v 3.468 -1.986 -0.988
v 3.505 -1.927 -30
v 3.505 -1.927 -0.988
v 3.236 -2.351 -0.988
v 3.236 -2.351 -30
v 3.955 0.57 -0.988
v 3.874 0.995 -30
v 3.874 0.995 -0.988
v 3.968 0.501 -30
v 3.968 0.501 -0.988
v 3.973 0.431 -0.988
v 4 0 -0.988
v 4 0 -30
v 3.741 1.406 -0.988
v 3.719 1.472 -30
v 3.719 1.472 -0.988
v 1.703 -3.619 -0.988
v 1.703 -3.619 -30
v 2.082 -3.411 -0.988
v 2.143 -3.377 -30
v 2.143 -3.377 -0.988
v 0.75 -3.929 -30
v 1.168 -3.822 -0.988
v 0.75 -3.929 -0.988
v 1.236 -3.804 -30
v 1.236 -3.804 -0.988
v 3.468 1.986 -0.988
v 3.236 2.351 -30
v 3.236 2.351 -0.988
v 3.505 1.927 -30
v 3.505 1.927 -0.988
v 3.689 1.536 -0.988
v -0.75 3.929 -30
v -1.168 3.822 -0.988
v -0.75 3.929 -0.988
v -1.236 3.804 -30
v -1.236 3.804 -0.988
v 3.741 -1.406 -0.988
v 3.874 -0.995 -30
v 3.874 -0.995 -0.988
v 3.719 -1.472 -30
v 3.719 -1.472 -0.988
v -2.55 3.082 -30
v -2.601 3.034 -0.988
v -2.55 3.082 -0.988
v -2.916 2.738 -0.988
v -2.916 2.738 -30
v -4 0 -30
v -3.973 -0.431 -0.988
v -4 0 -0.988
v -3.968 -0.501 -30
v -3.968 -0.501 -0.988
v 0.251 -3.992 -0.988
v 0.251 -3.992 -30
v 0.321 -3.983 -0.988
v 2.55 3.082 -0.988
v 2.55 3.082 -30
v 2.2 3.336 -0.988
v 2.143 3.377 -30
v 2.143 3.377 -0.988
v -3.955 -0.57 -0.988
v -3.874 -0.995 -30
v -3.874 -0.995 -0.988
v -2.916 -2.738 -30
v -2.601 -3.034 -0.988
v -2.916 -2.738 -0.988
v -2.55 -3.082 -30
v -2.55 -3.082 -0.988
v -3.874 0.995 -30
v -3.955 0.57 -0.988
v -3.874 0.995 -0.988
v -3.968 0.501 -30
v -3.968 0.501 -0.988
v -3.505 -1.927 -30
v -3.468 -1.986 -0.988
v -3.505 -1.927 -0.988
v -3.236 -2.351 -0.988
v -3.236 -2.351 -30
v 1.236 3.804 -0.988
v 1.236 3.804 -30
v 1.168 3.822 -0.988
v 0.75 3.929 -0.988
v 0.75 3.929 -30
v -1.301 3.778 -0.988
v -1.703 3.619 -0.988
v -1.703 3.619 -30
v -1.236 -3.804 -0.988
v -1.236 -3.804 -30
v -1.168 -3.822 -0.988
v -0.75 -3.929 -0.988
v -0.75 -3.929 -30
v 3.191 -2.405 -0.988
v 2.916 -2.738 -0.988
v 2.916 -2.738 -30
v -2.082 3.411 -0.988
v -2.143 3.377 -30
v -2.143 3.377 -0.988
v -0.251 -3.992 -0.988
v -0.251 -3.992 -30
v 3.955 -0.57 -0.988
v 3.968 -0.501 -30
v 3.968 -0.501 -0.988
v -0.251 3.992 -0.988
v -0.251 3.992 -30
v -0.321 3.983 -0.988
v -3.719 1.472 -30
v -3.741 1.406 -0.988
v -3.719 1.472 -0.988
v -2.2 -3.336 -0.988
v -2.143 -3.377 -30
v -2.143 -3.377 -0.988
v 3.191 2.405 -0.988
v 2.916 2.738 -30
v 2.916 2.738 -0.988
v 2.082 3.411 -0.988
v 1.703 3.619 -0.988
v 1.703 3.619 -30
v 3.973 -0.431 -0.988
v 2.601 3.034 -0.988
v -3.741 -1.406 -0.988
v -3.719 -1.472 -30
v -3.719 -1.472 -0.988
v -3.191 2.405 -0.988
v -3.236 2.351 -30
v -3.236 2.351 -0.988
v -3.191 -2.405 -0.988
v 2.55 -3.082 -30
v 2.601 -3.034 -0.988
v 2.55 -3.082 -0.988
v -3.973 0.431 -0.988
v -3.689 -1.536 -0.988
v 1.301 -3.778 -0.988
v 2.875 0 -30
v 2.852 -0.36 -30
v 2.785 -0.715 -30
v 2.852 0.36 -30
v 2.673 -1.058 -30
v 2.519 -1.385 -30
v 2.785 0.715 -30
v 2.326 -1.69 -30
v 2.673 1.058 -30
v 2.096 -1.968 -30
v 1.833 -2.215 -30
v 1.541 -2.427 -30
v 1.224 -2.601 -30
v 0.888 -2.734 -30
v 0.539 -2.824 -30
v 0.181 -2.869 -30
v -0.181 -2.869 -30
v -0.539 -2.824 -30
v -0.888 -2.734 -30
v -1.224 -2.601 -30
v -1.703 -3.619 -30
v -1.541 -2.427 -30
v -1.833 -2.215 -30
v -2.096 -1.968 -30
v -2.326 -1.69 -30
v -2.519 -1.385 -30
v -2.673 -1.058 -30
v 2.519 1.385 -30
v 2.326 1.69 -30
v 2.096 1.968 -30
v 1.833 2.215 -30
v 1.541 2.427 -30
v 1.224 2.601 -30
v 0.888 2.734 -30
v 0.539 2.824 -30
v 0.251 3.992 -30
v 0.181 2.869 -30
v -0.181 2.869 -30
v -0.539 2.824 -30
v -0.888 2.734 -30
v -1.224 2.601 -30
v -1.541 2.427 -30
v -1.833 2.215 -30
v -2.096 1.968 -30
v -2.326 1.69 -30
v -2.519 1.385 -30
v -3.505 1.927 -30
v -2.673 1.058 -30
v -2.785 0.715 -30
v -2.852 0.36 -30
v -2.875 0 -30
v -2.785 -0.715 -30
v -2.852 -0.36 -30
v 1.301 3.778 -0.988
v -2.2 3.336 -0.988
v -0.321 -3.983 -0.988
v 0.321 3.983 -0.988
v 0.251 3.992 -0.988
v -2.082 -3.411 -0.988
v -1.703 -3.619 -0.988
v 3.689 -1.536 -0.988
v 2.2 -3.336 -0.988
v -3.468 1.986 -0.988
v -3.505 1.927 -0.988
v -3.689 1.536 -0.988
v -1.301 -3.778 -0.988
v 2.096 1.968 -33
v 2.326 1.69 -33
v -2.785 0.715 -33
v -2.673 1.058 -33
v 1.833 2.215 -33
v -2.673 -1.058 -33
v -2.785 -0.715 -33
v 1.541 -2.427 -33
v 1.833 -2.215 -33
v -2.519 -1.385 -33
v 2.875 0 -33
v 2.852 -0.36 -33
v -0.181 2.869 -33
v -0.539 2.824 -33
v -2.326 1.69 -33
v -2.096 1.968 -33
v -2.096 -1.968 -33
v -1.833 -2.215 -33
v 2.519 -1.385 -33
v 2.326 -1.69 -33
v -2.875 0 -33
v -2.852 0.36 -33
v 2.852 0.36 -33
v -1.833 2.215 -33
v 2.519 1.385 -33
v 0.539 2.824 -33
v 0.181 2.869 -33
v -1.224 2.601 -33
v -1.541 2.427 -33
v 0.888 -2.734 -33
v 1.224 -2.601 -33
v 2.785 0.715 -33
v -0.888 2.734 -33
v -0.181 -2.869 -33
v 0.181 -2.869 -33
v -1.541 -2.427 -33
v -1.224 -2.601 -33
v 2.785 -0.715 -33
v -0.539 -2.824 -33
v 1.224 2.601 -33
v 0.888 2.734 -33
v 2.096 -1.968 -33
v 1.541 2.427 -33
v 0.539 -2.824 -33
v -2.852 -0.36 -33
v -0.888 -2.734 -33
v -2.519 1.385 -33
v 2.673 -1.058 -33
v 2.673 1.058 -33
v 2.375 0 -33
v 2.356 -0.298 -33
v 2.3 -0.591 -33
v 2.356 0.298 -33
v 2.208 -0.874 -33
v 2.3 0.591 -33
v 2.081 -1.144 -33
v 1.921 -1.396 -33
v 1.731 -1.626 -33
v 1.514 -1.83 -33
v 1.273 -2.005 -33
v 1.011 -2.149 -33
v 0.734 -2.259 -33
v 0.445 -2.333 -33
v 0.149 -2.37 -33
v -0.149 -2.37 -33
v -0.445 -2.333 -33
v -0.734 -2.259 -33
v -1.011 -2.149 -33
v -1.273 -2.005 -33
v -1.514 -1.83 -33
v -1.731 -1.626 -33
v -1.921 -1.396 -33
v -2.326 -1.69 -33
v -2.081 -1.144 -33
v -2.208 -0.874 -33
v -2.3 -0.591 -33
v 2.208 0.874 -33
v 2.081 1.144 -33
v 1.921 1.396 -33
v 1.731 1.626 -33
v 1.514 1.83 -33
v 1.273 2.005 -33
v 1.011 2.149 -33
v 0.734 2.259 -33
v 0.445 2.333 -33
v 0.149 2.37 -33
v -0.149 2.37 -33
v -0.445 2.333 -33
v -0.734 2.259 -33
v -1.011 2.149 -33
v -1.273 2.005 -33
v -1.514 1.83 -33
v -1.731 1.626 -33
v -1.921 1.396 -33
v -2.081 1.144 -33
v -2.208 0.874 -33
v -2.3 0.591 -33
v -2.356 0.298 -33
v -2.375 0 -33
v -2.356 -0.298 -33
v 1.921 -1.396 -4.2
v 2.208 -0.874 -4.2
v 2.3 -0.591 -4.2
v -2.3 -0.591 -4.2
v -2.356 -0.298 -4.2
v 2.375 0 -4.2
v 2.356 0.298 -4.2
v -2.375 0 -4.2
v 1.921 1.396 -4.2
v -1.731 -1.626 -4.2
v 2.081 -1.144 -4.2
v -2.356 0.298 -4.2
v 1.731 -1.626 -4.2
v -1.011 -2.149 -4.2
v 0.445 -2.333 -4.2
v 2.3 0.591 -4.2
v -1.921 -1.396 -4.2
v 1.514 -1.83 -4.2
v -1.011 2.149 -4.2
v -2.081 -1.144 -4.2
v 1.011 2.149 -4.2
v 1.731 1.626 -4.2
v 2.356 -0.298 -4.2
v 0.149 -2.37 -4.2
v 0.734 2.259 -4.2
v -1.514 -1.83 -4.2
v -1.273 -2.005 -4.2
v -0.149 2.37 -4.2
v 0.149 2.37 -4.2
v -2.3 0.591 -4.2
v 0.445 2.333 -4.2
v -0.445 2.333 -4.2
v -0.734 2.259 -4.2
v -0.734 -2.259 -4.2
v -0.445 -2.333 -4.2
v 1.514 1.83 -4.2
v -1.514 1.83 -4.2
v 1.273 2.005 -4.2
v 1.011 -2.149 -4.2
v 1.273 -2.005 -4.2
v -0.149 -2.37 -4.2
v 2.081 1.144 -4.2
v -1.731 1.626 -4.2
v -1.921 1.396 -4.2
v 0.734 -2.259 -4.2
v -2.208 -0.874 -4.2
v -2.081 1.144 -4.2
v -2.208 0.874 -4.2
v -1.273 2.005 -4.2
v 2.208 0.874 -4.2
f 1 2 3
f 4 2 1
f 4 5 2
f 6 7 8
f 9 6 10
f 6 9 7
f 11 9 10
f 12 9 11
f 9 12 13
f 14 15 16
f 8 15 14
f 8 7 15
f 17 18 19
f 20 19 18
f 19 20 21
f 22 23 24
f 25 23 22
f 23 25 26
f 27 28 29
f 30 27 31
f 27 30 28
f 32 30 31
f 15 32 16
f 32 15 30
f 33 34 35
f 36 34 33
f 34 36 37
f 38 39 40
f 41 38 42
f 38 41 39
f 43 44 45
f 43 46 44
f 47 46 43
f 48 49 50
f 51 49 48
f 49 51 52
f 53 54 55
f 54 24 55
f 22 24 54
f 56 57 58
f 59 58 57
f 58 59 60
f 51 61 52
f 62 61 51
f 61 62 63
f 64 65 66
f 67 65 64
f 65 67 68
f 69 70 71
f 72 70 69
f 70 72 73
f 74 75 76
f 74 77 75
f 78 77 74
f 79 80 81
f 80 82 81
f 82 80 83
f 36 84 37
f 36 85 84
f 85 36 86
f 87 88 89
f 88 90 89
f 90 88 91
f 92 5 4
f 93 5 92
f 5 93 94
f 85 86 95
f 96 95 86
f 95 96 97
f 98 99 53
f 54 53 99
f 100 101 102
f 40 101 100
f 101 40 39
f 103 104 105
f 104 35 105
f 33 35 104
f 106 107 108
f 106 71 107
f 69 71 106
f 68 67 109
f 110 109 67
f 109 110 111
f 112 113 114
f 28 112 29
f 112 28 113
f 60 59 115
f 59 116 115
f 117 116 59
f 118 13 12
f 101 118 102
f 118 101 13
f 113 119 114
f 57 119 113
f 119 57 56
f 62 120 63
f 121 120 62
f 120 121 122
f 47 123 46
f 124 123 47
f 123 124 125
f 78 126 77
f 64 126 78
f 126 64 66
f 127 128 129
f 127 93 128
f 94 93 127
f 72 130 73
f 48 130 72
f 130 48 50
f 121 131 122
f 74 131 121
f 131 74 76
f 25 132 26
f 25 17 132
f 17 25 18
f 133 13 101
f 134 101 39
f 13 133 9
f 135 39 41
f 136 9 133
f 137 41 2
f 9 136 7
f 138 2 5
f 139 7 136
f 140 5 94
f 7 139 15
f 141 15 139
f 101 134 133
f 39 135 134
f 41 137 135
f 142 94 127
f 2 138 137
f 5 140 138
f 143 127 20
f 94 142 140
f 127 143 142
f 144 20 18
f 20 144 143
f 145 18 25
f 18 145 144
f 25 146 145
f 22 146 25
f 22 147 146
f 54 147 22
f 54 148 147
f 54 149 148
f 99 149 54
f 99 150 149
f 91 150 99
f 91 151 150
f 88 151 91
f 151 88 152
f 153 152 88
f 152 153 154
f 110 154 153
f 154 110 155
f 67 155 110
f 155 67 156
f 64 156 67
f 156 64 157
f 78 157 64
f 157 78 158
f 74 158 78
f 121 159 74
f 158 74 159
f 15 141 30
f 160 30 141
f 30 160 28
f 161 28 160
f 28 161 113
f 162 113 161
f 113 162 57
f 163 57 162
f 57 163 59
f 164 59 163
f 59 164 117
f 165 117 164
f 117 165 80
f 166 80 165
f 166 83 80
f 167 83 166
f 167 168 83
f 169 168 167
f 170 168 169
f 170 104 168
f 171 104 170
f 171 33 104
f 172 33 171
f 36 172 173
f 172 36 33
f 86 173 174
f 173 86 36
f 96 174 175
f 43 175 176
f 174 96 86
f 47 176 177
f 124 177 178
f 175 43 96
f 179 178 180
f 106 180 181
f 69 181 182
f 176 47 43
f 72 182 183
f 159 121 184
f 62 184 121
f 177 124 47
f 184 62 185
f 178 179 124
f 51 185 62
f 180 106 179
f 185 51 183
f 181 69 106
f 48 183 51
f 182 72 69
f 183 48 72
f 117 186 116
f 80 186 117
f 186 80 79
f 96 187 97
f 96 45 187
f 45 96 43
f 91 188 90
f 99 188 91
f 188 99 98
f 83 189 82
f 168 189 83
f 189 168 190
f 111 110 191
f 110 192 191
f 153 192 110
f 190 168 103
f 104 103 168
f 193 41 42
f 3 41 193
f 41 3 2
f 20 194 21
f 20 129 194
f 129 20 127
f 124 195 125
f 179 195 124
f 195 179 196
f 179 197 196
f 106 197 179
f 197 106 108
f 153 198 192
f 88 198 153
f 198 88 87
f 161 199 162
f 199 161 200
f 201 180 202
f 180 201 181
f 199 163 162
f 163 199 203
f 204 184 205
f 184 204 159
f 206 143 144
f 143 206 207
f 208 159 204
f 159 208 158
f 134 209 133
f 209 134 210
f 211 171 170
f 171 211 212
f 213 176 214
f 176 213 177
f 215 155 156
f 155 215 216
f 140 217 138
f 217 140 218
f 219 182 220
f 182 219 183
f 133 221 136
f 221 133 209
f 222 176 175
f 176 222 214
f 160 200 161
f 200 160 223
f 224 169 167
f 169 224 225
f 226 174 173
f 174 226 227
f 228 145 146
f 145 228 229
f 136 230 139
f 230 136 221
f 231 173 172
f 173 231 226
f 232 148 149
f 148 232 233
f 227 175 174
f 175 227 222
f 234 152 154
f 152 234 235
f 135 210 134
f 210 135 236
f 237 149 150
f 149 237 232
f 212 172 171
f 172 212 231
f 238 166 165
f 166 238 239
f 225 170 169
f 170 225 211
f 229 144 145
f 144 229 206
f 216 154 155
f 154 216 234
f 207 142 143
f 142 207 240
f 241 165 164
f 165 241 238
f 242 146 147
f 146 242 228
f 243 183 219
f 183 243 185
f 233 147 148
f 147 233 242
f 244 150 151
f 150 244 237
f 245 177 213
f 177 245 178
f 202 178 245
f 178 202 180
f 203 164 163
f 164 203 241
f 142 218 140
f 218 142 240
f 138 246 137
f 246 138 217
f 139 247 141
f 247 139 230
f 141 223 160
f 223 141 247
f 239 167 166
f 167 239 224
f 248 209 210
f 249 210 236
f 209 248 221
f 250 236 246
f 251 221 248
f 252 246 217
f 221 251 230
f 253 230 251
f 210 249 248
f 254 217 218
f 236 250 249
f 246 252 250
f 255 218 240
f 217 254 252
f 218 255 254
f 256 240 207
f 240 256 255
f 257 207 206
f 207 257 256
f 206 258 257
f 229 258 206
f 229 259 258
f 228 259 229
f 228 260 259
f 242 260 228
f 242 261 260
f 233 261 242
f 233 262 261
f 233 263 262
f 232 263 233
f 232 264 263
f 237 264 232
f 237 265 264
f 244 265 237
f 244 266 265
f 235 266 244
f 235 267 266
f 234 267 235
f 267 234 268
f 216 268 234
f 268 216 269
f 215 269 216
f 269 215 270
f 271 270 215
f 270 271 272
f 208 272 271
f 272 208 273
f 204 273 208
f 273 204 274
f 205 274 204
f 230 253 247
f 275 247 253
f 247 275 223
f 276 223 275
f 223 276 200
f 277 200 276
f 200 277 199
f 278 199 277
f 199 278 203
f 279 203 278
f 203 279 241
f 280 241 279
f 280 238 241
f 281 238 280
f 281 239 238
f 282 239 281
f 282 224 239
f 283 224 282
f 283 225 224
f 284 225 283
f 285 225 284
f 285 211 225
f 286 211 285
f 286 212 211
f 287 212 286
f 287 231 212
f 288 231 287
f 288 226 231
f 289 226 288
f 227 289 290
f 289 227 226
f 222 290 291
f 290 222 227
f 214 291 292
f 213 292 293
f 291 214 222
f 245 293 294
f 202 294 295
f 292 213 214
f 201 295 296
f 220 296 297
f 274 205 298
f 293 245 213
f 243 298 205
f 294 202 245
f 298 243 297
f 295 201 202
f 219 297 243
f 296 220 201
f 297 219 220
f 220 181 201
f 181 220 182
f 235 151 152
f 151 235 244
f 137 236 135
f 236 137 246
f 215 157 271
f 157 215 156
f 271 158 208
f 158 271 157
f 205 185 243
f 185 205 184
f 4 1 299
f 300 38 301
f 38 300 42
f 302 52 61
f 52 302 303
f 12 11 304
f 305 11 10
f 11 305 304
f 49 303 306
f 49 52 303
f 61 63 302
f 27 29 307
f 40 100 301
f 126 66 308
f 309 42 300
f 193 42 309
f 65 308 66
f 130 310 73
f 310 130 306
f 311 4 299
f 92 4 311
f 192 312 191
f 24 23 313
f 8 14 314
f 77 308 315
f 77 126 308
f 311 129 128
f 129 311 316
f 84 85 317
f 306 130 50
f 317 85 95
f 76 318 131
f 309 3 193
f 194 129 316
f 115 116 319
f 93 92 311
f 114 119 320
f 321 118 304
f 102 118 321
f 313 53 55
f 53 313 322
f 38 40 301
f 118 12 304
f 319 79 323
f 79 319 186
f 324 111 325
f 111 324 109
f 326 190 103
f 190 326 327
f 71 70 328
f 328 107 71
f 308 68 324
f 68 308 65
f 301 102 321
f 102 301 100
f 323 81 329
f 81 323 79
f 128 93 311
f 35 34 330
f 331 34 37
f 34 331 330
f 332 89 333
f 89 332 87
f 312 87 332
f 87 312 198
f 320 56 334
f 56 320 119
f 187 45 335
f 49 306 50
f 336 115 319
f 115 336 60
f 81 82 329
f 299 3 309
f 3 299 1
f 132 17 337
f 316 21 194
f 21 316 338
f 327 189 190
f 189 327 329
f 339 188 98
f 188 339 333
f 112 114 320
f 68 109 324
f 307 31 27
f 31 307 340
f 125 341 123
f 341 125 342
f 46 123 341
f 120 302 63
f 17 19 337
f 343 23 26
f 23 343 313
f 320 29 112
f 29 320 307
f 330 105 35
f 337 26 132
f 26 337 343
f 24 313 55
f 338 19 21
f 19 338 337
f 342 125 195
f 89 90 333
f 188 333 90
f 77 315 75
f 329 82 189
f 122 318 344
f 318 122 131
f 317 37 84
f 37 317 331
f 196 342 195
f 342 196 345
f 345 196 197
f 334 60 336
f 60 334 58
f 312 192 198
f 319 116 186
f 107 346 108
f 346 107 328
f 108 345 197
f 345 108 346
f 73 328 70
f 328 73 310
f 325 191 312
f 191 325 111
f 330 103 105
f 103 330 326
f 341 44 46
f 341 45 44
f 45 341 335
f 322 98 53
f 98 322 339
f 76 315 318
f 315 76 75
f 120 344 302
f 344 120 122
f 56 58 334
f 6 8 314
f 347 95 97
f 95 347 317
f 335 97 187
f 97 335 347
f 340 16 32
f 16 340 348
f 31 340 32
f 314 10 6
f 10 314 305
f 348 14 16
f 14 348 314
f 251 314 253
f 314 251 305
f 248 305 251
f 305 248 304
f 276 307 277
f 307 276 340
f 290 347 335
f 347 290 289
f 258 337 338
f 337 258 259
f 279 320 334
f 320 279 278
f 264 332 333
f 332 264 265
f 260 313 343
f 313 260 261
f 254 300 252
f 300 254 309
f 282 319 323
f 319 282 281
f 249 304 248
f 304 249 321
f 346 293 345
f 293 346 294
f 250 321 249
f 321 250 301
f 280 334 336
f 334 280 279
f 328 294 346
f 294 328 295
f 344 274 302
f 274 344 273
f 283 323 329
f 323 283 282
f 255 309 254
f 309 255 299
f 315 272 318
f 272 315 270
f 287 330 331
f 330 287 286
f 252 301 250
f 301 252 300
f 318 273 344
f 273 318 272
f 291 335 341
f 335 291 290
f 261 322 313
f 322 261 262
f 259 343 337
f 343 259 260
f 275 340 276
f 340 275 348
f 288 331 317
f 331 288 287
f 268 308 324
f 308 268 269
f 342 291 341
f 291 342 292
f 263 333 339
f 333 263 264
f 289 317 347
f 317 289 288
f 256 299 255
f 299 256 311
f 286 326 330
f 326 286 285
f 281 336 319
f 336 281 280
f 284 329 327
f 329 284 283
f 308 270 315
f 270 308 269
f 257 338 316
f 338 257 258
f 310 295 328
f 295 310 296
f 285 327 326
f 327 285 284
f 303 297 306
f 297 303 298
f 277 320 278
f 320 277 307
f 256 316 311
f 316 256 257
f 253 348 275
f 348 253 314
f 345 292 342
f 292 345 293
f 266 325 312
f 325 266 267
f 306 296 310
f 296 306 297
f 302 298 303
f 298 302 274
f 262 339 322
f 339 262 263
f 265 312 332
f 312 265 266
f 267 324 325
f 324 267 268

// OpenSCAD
$fn = 50;

difference() {
	union() {
		translate(v = [0, 0, -30.0]) {
			cylinder(h = 30, r = 4.0);
		}
		#translate(v = [0, 0, -33.0]) {
			cylinder(h = 33, r = 2.875);
		}
	}
	union() {
		translate(v = [0, 0, 0]) {
			rotate(a = [0, 0, 0]) {
				difference() {
					union() {
						translate(v = [0, 0, -33.0]) {
							cylinder(h = 33, r = 2.25);
						}
						translate(v = [0, 0, -4.2]) {
							cylinder(h = 4.2, r1 = 2.375, r2 = 4.5);
						}
						translate(v = [0, 0, -33.0]) {
							cylinder(h = 33, r = 2.375);
						}
						translate(v = [0, 0, -33.0]) {
							cylinder(h = 33, r = 2.25);
						}
					}
					union();
				}
			}
		}
	}
}
